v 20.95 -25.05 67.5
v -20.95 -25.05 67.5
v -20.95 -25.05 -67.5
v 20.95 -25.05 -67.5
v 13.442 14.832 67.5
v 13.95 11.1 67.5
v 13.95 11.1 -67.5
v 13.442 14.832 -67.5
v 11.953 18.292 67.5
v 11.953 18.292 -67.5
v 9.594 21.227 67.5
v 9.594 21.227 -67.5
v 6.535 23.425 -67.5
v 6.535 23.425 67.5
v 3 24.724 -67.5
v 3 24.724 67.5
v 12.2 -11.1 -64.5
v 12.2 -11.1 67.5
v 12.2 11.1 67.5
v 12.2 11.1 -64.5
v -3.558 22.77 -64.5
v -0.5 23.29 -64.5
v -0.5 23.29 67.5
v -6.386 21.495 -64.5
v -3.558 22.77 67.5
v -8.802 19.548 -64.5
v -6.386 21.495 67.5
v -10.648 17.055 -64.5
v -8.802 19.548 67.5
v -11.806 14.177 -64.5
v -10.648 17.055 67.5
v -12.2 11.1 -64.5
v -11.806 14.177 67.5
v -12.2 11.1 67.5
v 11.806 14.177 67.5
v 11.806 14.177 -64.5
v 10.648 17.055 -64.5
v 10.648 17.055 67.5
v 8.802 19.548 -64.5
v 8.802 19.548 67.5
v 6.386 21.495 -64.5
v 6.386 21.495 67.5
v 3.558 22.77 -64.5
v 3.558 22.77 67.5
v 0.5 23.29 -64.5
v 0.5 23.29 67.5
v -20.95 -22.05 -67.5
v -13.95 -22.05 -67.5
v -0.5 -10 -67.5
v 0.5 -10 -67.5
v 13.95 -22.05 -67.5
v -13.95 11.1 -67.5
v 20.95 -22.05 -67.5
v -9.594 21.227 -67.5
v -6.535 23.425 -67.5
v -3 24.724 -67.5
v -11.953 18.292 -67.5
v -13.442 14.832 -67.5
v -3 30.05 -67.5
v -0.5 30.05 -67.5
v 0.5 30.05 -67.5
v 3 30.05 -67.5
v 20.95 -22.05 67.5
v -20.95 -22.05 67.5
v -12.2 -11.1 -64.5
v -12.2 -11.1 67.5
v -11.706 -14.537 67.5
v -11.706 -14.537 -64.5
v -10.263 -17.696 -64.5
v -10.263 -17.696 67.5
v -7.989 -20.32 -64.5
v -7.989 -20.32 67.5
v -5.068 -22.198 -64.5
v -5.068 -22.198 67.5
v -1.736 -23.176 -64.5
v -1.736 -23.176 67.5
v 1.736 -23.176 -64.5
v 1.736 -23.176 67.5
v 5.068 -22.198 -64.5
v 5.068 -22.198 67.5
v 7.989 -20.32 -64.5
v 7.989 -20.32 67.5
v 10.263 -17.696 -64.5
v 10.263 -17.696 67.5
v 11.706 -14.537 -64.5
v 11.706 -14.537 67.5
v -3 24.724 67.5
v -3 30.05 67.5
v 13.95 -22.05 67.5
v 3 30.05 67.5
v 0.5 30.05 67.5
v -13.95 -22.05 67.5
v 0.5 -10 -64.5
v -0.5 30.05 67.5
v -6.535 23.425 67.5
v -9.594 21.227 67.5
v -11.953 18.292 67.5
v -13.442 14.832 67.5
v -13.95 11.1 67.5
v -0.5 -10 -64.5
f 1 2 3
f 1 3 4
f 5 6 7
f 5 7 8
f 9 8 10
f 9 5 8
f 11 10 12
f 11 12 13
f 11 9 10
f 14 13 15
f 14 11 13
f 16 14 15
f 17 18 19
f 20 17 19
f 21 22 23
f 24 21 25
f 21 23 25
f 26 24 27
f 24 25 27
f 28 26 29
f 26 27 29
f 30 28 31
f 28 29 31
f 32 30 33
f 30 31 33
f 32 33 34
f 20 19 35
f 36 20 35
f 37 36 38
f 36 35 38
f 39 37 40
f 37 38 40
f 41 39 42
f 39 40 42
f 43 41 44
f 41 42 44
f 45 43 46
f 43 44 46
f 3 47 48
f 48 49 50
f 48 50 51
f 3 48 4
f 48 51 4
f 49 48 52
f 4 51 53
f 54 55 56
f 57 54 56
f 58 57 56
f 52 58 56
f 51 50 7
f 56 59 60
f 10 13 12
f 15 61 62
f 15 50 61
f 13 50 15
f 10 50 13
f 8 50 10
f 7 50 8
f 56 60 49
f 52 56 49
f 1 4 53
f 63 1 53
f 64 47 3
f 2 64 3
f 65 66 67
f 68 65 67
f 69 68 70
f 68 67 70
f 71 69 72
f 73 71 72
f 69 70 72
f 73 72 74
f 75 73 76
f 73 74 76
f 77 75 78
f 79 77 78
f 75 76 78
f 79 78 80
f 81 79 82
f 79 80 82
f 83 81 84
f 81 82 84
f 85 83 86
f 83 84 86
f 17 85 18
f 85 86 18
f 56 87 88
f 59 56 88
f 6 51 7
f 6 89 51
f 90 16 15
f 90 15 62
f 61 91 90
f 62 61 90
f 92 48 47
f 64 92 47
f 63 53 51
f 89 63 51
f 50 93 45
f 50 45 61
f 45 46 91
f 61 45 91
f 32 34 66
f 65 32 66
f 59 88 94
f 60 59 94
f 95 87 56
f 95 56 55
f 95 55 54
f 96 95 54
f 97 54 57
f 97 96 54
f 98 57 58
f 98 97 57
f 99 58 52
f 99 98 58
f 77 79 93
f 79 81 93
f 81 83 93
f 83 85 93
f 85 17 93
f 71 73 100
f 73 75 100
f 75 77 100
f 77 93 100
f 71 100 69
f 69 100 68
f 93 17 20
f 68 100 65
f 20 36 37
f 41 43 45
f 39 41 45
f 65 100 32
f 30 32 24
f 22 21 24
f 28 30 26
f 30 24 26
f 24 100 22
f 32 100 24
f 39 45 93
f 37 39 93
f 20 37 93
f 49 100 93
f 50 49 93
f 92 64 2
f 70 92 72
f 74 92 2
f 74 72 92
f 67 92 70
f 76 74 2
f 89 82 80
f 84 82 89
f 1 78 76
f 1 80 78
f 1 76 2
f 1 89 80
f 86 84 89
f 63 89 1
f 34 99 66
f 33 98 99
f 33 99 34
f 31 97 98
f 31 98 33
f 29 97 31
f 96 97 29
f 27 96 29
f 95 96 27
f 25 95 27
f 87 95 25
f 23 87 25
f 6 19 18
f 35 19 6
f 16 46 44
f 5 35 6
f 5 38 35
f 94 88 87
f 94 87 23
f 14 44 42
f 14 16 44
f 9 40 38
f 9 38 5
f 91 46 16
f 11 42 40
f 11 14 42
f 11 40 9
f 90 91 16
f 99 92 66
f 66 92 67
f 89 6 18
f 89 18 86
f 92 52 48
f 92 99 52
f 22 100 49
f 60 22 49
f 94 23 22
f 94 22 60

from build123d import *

# Parameters (mm, degrees)
BOSS_EXTRUDE1_DEPTH = 67.5
BOSS_EXTRUDE2_START = -3
BOSS_EXTRUDE2_DEPTH = 3
SKETCH6_W           = 6
SKETCH6_H           = 6.75
BOSS_EXTRUDE3_DEPTH = 135
SKETCH7_W           = 1
SKETCH7_H           = 40.05
CUT_EXTRUDE2_DEPTH  = 140.881753635


with BuildPart() as part:
    # Sketch2 → Boss-Extrude1 (new, symmetric)
    with BuildSketch(Plane.XY):
        with BuildLine():
            Line((-13.95, 11.1), (-13.95, -11.1))
            Line((-13.95, -11.1), (-13.95, -22.05))
            Line((-13.95, -22.05), (-20.95, -22.05))
            Line((-20.95, -22.05), (-20.95, -25.05))
            Line((-20.95, -25.05), (20.95, -25.05))
            Line((20.95, -25.05), (20.95, -22.05))
            Line((20.95, -22.05), (13.95, -22.05))
            Line((13.95, -22.05), (13.95, -11.1))
            Line((13.95, -11.1), (13.95, 11.1))
            ThreePointArc((13.95, 11.1), (0, 25.05), (-13.95, 11.1))
        make_face()
        with BuildLine():
            Line((12.2, -11.1), (12.2, 11.1))
            ThreePointArc((12.2, 11.1), (0, 23.3), (-12.2, 11.1))
            Line((-12.2, 11.1), (-12.2, -11.1))
            ThreePointArc((-12.2, -11.1), (0, -23.3), (12.2, -11.1))
        make_face(mode=Mode.SUBTRACT)
    extrude(amount=BOSS_EXTRUDE1_DEPTH, both=True)

    # Sketch5 → Boss-Extrude2 (add)
    with BuildSketch(Plane(origin=(0, 0, -67.5), x_dir=(-1, 0, 0), z_dir=(0, 0, -1)).offset(BOSS_EXTRUDE2_START)):
        with BuildLine():
            Line((-13.95, 11.1), (-13.95, -22.05))
            Line((-13.95, -22.05), (-20.95, -22.05))
            Line((-20.95, -22.05), (-20.95, -25.05))
            Line((-20.95, -25.05), (20.95, -25.05))
            Line((20.95, -25.05), (20.95, -22.05))
            Line((20.95, -22.05), (13.95, -22.05))
            Line((13.95, -22.05), (13.95, 11.1))
            ThreePointArc((13.95, 11.1), (0, 25.05), (-13.95, 11.1))
        make_face()
    extrude(amount=BOSS_EXTRUDE2_DEPTH)

    # Sketch6 → Boss-Extrude3 (add)
    with BuildSketch(Plane.XY.offset(67.5)):
        with Locations((0, 26.675)):
            Rectangle(SKETCH6_W, SKETCH6_H)
    extrude(amount=-BOSS_EXTRUDE3_DEPTH)

    # Sketch7 → Cut-Extrude2 (cut, through all)
    with BuildSketch(Plane.XY.offset(67.5)):
        with Locations((0, 10.025)):
            Rectangle(SKETCH7_W, SKETCH7_H)
    extrude(amount=-CUT_EXTRUDE2_DEPTH, mode=Mode.SUBTRACT)


solid = part.part
